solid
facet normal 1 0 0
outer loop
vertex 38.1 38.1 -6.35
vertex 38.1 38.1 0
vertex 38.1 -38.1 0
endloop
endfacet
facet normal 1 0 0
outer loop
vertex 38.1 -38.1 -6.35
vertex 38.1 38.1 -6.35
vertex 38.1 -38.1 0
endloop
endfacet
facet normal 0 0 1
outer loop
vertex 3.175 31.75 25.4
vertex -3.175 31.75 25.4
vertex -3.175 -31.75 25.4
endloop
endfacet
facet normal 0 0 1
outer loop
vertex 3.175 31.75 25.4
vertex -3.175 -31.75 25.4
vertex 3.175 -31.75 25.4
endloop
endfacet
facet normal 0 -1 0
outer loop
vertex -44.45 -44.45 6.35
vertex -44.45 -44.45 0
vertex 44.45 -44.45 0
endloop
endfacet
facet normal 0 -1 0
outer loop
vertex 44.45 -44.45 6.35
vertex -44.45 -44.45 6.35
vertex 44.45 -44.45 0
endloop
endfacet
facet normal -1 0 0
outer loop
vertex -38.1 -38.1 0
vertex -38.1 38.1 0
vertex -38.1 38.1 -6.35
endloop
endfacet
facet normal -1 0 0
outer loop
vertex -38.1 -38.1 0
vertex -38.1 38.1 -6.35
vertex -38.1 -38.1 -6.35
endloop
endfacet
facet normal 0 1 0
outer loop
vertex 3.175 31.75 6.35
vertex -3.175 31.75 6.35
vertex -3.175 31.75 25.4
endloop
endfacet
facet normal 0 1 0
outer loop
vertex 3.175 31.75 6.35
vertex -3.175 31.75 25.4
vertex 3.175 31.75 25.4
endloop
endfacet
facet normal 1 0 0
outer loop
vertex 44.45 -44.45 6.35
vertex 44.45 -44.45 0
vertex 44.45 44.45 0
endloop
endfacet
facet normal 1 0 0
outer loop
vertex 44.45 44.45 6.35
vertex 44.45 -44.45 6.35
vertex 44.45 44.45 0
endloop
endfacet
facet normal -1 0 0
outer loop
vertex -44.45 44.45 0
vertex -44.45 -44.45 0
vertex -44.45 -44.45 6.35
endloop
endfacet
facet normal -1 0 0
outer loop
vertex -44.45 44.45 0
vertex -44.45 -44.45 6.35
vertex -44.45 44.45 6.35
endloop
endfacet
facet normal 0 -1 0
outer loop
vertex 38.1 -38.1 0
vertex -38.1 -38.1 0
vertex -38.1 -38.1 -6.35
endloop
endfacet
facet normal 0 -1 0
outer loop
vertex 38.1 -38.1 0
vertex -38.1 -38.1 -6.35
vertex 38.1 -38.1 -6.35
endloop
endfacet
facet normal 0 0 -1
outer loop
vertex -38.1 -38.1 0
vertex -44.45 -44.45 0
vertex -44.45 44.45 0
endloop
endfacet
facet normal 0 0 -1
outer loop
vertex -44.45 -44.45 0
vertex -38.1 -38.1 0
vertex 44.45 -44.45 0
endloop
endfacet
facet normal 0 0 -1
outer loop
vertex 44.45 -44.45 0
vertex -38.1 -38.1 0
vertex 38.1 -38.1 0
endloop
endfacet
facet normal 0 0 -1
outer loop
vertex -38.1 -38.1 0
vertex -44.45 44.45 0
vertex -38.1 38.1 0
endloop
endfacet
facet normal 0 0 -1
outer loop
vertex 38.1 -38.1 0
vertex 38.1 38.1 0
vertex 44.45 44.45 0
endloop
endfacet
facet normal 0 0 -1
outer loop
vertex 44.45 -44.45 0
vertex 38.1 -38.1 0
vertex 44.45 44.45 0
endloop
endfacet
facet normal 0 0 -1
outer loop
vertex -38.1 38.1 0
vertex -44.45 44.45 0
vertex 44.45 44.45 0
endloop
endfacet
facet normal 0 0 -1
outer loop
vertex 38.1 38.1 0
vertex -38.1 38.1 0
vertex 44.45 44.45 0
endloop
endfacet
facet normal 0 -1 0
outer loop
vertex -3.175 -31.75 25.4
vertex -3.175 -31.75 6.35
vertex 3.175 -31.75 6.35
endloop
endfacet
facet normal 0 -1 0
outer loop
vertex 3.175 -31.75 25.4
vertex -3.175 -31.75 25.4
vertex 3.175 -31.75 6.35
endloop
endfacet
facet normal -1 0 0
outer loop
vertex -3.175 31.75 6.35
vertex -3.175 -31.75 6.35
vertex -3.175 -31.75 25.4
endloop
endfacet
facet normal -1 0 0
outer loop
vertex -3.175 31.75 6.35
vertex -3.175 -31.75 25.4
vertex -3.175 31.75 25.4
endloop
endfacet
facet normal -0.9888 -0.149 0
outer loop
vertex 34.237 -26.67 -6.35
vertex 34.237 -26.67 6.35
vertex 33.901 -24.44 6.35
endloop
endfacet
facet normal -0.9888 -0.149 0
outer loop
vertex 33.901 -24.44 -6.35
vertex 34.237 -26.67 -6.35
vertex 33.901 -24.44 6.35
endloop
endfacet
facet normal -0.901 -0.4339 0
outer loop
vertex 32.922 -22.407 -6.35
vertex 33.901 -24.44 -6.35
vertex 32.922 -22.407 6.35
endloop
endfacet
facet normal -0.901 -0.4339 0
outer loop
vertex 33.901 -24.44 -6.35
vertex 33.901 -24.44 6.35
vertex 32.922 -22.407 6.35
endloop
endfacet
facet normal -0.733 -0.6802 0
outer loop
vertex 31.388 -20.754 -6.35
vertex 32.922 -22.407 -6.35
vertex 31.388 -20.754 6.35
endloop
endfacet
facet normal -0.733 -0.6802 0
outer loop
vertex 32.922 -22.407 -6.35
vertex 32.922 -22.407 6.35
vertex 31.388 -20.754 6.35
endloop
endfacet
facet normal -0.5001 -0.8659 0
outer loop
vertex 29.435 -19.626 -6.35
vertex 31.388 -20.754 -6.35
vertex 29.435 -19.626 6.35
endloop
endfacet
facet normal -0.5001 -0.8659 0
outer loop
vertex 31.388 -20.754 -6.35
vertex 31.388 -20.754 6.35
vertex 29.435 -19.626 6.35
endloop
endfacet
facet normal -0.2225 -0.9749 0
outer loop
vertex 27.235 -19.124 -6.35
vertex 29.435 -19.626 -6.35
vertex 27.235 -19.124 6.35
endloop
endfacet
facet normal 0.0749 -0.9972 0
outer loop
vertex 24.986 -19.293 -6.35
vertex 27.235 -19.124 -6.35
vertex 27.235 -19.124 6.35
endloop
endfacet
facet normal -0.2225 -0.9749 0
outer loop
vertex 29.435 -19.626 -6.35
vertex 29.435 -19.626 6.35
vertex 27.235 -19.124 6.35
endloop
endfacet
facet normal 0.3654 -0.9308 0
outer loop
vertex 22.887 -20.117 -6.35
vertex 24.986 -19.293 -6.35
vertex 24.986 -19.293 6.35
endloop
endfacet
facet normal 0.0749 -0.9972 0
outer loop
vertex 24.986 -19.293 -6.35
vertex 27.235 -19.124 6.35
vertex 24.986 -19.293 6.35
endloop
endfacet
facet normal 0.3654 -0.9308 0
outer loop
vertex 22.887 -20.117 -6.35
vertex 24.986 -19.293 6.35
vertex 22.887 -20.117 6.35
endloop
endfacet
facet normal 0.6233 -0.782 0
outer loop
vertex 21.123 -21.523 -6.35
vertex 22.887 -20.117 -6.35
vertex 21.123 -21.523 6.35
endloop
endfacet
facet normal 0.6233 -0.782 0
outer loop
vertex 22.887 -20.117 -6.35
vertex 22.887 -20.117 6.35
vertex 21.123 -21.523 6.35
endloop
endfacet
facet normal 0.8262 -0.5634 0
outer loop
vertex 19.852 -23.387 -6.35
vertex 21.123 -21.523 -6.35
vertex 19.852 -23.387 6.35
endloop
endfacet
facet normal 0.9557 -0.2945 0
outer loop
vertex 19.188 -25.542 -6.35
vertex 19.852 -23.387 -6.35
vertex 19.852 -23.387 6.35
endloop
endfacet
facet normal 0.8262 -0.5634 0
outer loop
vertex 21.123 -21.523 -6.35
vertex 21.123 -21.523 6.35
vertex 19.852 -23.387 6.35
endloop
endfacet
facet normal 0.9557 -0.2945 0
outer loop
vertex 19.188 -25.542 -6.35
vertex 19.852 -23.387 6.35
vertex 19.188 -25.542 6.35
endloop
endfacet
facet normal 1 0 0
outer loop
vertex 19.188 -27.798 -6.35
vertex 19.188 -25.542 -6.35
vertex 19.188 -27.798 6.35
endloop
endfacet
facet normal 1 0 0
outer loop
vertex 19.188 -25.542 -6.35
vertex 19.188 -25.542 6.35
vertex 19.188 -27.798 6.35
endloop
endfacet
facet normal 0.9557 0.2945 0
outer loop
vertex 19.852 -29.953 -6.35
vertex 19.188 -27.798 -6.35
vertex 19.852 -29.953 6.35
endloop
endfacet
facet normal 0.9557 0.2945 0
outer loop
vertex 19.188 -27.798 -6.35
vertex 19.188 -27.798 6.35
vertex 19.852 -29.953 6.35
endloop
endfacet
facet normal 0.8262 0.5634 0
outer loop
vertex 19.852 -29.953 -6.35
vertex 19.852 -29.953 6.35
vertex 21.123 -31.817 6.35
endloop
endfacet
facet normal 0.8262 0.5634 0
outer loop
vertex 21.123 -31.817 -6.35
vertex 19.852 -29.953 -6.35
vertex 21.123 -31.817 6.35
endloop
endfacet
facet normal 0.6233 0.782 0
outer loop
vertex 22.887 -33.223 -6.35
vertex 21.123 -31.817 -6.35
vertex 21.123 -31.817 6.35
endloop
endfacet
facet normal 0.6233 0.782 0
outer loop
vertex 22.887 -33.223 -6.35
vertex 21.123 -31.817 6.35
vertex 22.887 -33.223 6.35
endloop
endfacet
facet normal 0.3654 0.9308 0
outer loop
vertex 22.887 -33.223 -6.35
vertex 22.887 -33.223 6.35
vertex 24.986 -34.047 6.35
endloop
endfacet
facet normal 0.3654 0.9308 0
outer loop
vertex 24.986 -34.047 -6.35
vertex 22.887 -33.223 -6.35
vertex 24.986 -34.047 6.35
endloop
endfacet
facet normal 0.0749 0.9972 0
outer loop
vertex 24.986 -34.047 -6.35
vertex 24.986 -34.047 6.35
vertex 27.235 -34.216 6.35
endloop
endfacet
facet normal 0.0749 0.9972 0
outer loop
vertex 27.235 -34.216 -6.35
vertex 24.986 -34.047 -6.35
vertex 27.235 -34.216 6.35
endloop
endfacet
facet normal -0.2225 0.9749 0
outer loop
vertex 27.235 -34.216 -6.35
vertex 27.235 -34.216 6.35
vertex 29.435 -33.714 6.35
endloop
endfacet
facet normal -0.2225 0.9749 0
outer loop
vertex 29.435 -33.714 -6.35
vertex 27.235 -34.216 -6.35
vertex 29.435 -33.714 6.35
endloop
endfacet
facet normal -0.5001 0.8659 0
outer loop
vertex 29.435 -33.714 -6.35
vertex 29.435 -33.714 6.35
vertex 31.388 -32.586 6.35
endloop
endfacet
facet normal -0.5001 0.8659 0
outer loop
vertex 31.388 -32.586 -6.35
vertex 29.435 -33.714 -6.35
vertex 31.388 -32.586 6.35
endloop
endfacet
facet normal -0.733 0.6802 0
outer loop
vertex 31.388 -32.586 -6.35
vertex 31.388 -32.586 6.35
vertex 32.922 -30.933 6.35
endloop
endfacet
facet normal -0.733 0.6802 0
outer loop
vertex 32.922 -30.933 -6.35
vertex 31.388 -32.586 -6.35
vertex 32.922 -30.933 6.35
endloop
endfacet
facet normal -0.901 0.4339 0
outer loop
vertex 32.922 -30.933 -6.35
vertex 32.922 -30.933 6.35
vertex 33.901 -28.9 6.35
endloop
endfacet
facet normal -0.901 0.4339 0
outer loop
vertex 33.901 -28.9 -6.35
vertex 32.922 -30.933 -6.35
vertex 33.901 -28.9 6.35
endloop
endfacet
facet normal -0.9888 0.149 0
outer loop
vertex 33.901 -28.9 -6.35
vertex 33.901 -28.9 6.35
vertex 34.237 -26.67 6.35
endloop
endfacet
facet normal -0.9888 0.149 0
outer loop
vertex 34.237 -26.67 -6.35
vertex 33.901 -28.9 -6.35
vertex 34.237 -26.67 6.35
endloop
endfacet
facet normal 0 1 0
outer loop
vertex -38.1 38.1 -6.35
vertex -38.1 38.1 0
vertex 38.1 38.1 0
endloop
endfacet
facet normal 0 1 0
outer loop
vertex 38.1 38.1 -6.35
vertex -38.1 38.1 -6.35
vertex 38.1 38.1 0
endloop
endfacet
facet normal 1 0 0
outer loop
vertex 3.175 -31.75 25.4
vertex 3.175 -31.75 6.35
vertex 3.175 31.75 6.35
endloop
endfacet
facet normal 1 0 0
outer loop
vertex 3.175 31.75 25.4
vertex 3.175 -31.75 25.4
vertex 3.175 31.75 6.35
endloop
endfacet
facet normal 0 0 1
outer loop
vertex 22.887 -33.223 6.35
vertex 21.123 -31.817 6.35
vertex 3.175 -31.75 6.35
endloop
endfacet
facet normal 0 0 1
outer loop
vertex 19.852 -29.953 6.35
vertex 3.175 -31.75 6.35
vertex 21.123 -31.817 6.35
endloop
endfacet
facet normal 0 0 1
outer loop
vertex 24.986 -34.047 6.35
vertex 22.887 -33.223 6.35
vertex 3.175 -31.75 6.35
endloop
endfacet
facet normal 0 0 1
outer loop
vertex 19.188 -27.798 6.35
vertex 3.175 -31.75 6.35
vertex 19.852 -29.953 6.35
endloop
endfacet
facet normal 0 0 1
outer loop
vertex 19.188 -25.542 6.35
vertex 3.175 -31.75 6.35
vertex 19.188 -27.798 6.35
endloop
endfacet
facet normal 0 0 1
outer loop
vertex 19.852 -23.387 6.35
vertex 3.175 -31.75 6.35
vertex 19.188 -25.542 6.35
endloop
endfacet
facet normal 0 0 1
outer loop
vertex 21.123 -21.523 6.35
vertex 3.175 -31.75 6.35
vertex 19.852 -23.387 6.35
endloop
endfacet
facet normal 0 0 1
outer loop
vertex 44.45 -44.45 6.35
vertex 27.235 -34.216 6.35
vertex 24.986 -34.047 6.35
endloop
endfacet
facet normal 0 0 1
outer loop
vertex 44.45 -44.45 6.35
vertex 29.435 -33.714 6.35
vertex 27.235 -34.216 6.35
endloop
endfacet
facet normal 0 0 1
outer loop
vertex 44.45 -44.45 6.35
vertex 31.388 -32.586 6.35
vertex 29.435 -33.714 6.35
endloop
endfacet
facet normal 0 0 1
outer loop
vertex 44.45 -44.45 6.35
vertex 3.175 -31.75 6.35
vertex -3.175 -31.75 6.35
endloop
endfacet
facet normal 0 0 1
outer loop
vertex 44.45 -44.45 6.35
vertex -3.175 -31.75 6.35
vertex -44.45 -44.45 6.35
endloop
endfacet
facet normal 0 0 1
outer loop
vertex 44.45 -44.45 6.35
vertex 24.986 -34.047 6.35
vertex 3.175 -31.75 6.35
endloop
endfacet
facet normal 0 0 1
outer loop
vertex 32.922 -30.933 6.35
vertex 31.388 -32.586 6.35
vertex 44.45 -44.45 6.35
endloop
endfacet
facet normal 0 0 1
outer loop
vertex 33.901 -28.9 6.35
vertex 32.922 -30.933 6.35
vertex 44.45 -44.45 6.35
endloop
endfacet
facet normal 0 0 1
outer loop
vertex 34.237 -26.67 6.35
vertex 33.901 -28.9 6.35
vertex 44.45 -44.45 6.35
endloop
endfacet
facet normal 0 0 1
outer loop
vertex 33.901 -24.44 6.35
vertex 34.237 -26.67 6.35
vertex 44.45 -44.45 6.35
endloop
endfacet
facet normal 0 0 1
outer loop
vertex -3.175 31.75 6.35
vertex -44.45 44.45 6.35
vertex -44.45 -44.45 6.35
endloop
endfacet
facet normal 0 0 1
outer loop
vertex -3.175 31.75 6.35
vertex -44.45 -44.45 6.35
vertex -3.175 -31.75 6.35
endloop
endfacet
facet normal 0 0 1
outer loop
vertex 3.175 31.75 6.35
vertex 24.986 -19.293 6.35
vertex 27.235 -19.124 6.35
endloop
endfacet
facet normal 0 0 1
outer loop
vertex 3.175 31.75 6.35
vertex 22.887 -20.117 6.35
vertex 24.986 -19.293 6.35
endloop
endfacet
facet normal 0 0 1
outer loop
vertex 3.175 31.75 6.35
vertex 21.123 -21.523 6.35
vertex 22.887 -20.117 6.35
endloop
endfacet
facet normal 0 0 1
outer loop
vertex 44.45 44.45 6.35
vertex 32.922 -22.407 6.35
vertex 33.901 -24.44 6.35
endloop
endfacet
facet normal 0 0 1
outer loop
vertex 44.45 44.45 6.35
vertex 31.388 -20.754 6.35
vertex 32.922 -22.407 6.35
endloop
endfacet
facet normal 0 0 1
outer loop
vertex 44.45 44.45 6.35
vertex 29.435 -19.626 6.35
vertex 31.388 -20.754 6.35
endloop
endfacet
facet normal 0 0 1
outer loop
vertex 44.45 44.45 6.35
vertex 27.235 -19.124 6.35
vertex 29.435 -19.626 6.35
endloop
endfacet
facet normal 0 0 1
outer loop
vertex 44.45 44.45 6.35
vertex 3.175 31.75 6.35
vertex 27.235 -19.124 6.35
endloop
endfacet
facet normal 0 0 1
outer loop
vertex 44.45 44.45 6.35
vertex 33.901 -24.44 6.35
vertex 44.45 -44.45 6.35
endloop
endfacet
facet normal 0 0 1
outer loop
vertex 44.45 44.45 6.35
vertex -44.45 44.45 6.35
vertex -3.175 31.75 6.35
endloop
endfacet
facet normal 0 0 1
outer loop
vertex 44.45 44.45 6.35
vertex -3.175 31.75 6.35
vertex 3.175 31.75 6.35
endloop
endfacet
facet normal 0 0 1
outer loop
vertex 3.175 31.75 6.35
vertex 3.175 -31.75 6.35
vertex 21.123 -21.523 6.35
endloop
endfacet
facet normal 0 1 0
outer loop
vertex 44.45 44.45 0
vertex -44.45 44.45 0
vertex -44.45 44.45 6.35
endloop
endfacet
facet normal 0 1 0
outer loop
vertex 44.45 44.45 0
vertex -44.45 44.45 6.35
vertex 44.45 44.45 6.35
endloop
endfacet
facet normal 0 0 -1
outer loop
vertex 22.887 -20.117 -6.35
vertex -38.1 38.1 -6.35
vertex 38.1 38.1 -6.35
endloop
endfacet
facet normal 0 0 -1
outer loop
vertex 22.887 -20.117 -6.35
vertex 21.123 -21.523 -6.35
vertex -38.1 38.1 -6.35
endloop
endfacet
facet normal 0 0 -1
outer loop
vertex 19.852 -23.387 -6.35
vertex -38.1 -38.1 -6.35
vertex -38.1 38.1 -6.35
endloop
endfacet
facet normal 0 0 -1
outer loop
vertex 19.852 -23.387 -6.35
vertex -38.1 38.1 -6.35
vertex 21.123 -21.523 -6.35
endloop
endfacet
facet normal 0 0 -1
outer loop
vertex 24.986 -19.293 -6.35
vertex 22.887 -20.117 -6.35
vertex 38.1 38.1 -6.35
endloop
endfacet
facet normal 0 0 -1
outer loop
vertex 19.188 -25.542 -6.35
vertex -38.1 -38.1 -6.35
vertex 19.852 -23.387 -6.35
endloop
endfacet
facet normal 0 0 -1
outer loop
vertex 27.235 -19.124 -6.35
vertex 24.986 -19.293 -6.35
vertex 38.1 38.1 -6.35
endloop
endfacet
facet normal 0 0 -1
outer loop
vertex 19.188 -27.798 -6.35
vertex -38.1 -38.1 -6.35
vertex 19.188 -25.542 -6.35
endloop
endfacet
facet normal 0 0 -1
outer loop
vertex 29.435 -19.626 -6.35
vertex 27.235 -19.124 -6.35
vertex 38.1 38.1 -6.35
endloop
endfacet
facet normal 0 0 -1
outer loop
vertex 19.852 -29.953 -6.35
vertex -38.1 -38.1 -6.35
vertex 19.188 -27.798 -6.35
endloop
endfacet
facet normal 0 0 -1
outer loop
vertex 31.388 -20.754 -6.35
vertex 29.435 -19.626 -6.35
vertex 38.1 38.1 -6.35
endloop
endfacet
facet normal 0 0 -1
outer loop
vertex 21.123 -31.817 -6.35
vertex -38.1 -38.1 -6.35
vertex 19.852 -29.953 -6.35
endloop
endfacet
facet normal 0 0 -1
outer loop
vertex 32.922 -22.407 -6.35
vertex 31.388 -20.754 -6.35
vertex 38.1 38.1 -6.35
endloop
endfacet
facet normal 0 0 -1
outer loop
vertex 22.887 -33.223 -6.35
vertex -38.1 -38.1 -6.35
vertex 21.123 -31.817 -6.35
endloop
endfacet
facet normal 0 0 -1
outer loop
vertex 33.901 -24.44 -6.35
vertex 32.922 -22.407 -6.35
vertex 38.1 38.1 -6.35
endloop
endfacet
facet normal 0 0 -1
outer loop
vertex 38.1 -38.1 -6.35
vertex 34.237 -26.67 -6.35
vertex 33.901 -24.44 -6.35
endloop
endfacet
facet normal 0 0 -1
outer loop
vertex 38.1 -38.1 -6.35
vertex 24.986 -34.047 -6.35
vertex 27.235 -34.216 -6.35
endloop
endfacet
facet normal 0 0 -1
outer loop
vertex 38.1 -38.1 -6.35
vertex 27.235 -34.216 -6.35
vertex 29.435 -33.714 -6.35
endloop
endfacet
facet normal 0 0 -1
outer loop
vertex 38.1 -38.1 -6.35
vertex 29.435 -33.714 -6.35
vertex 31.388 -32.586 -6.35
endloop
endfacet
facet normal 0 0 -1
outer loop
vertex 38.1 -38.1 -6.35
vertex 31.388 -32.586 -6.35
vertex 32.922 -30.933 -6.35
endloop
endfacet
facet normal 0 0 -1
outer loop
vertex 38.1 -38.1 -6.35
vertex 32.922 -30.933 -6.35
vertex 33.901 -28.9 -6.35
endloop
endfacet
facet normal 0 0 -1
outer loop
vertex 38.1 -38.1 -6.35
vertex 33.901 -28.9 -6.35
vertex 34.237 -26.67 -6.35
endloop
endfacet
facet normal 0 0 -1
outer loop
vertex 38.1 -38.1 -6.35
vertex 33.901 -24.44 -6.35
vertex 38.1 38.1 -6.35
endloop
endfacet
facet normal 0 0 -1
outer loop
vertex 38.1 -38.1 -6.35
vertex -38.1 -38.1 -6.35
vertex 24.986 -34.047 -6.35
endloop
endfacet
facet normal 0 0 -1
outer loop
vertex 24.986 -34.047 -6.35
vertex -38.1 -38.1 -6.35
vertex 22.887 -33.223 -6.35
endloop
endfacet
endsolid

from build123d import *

# Parameters (mm, degrees)
F0_W     = 88.9
F0_H     = 88.9
F1_DEPTH = 6.35
F2_W     = 76.2
F2_H     = 76.2
F3_DEPTH = 6.35
F4_W     = 6.35
F4_H     = 63.5
F5_DEPTH = 19.05
F6_R     = 7.56699
F7_DEPTH = 25.4


with BuildPart() as f1:
    # F0 (on Top) → F1 (new body)
    with BuildSketch(Plane.XY):
        Rectangle(F0_W, F0_H)
    extrude(amount=F1_DEPTH)

    # F2 (on face) → F3 (join)
    with BuildSketch(Plane(origin=(0, 0, 0), x_dir=(1, 0, 0), z_dir=(0, 0, -1))):
        Rectangle(F2_W, F2_H)
    extrude(amount=F3_DEPTH)

    # F4 (on face) → F5 (join)
    with BuildSketch(Plane.XY.offset(6.35)):
        Rectangle(F4_W, F4_H)
    extrude(amount=F5_DEPTH)

    # F6 (on face) → F7 (cut)
    with BuildSketch(Plane.XY.offset(6.35)):
        with Locations((26.67, -26.67)):
            Circle(F6_R)
    extrude(amount=-F7_DEPTH, mode=Mode.SUBTRACT)


solid = f1.part
